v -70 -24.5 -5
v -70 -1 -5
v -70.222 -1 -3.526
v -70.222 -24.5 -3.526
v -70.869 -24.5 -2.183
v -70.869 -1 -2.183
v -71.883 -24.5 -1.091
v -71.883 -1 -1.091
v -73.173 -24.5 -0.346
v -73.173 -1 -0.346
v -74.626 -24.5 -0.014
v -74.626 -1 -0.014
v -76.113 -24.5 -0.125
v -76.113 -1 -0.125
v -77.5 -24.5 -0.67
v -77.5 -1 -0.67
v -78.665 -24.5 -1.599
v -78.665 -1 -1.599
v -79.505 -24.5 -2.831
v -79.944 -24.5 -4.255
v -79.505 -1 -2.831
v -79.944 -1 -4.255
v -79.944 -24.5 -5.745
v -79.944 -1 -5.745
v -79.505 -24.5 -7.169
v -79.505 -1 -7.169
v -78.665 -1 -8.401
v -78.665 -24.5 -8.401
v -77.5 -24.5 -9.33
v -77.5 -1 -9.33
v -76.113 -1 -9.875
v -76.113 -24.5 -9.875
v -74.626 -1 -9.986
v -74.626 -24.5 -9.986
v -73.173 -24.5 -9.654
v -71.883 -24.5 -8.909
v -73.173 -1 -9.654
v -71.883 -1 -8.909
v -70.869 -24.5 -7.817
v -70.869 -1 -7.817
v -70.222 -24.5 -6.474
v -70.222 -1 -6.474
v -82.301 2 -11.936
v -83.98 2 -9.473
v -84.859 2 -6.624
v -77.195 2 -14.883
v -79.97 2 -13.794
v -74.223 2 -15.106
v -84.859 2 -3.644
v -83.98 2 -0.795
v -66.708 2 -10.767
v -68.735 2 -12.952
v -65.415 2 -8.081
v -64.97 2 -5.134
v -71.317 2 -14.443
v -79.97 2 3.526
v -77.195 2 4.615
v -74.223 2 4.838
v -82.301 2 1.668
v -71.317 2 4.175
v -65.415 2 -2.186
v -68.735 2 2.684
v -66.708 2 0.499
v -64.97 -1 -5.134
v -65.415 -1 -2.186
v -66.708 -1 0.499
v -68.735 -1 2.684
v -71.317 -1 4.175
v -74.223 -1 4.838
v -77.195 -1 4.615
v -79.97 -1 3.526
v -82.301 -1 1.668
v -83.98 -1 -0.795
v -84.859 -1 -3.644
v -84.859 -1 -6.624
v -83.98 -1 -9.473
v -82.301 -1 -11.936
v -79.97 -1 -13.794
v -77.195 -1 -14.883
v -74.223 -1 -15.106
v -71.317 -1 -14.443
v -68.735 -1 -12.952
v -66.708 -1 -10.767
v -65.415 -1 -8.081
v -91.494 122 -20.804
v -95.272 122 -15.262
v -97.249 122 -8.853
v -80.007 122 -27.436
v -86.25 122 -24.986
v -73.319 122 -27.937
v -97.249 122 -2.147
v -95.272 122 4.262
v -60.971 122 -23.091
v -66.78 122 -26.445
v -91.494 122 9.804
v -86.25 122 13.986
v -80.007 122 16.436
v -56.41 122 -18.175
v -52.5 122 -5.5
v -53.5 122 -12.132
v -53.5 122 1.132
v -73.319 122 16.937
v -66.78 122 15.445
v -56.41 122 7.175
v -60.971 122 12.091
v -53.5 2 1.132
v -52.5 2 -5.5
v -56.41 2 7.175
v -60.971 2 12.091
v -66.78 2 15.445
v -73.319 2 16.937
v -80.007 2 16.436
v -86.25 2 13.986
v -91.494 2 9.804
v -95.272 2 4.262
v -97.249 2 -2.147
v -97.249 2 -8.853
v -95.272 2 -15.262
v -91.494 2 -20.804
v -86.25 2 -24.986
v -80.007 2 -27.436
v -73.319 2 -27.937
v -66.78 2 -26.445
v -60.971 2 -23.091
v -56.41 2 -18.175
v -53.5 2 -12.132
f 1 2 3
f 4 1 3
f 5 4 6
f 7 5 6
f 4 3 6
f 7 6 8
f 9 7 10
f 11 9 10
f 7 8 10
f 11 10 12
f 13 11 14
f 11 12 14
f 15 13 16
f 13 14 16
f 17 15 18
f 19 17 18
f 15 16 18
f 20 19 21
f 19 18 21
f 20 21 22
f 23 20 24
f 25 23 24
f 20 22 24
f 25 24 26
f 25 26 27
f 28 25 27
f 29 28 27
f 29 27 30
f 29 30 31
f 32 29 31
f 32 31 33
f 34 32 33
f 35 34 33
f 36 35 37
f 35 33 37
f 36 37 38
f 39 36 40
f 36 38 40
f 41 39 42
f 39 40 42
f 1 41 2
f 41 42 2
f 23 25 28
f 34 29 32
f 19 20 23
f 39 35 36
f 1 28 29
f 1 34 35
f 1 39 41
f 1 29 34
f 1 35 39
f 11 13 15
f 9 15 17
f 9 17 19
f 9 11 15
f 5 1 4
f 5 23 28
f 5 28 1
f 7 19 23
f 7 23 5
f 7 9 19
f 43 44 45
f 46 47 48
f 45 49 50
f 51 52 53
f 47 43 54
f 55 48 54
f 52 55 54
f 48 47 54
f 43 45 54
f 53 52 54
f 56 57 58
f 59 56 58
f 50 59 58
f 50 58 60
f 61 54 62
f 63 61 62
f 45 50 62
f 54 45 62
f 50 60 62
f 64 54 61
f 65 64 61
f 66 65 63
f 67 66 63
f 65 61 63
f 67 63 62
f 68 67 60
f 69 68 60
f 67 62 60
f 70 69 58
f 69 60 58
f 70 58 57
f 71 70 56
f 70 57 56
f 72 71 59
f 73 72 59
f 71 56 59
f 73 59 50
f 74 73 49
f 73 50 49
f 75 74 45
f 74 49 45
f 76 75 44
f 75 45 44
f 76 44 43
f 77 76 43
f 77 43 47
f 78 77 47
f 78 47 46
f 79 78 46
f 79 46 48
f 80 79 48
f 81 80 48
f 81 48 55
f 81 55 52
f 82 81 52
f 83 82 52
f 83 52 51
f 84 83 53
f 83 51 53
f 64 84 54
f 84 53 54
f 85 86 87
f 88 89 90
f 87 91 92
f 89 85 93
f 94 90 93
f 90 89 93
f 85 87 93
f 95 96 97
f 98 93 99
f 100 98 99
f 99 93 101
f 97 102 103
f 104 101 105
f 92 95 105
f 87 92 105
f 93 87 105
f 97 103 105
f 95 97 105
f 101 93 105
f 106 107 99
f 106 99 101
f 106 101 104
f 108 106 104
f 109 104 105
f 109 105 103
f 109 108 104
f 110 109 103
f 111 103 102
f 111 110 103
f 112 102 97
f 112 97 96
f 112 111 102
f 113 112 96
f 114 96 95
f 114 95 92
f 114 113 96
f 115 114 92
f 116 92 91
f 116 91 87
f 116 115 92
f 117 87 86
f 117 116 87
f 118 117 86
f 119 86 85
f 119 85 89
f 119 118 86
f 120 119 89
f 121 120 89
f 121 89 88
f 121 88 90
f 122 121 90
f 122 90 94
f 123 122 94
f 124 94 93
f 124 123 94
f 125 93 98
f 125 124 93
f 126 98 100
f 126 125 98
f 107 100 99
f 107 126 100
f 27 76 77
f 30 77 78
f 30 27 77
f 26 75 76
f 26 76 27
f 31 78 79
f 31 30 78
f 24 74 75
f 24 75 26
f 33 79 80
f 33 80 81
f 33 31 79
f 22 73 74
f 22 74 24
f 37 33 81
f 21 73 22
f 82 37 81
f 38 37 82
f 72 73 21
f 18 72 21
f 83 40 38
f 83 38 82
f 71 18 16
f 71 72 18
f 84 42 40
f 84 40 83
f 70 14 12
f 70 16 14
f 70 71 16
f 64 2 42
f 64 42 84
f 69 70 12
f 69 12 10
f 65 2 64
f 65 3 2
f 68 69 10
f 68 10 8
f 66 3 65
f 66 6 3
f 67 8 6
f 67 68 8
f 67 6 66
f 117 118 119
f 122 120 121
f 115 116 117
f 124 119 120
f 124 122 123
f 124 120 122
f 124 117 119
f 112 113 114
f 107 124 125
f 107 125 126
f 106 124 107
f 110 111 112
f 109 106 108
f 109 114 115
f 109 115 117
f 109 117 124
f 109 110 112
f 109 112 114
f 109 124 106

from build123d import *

# Parameters (mm, degrees)
SKETCH003_R  = 22.5
PAD003_DEPTH = 120
SKETCH_R     = 5
PAD_DEPTH    = 23.5
SKETCH004_R  = 10
PAD004_DEPTH = 3


with BuildPart() as gear_motor:
    # Sketch003 → Pad003 (new body)
    with BuildSketch(Plane(origin=(-7, 2, -25.5), x_dir=(1, 0, 0), z_dir=(0, -1, 0))):
        with Locations((-68, 20)):
            Circle(SKETCH003_R)
    extrude(amount=-PAD003_DEPTH)


with BuildPart() as body:
    # Sketch → Pad (new body)
    with BuildSketch(Plane.XZ.offset(1)):
        with Locations((-75, -5)):
            Circle(SKETCH_R)
    extrude(amount=PAD_DEPTH)

    # Sketch004 → Pad004 (join)
    with BuildSketch(Plane.XZ.offset(-2)):
        with Locations((-74.970276, -5.133937)):
            Circle(SKETCH004_R)
    extrude(amount=PAD004_DEPTH)


solid = Compound([gear_motor.part, body.part])
